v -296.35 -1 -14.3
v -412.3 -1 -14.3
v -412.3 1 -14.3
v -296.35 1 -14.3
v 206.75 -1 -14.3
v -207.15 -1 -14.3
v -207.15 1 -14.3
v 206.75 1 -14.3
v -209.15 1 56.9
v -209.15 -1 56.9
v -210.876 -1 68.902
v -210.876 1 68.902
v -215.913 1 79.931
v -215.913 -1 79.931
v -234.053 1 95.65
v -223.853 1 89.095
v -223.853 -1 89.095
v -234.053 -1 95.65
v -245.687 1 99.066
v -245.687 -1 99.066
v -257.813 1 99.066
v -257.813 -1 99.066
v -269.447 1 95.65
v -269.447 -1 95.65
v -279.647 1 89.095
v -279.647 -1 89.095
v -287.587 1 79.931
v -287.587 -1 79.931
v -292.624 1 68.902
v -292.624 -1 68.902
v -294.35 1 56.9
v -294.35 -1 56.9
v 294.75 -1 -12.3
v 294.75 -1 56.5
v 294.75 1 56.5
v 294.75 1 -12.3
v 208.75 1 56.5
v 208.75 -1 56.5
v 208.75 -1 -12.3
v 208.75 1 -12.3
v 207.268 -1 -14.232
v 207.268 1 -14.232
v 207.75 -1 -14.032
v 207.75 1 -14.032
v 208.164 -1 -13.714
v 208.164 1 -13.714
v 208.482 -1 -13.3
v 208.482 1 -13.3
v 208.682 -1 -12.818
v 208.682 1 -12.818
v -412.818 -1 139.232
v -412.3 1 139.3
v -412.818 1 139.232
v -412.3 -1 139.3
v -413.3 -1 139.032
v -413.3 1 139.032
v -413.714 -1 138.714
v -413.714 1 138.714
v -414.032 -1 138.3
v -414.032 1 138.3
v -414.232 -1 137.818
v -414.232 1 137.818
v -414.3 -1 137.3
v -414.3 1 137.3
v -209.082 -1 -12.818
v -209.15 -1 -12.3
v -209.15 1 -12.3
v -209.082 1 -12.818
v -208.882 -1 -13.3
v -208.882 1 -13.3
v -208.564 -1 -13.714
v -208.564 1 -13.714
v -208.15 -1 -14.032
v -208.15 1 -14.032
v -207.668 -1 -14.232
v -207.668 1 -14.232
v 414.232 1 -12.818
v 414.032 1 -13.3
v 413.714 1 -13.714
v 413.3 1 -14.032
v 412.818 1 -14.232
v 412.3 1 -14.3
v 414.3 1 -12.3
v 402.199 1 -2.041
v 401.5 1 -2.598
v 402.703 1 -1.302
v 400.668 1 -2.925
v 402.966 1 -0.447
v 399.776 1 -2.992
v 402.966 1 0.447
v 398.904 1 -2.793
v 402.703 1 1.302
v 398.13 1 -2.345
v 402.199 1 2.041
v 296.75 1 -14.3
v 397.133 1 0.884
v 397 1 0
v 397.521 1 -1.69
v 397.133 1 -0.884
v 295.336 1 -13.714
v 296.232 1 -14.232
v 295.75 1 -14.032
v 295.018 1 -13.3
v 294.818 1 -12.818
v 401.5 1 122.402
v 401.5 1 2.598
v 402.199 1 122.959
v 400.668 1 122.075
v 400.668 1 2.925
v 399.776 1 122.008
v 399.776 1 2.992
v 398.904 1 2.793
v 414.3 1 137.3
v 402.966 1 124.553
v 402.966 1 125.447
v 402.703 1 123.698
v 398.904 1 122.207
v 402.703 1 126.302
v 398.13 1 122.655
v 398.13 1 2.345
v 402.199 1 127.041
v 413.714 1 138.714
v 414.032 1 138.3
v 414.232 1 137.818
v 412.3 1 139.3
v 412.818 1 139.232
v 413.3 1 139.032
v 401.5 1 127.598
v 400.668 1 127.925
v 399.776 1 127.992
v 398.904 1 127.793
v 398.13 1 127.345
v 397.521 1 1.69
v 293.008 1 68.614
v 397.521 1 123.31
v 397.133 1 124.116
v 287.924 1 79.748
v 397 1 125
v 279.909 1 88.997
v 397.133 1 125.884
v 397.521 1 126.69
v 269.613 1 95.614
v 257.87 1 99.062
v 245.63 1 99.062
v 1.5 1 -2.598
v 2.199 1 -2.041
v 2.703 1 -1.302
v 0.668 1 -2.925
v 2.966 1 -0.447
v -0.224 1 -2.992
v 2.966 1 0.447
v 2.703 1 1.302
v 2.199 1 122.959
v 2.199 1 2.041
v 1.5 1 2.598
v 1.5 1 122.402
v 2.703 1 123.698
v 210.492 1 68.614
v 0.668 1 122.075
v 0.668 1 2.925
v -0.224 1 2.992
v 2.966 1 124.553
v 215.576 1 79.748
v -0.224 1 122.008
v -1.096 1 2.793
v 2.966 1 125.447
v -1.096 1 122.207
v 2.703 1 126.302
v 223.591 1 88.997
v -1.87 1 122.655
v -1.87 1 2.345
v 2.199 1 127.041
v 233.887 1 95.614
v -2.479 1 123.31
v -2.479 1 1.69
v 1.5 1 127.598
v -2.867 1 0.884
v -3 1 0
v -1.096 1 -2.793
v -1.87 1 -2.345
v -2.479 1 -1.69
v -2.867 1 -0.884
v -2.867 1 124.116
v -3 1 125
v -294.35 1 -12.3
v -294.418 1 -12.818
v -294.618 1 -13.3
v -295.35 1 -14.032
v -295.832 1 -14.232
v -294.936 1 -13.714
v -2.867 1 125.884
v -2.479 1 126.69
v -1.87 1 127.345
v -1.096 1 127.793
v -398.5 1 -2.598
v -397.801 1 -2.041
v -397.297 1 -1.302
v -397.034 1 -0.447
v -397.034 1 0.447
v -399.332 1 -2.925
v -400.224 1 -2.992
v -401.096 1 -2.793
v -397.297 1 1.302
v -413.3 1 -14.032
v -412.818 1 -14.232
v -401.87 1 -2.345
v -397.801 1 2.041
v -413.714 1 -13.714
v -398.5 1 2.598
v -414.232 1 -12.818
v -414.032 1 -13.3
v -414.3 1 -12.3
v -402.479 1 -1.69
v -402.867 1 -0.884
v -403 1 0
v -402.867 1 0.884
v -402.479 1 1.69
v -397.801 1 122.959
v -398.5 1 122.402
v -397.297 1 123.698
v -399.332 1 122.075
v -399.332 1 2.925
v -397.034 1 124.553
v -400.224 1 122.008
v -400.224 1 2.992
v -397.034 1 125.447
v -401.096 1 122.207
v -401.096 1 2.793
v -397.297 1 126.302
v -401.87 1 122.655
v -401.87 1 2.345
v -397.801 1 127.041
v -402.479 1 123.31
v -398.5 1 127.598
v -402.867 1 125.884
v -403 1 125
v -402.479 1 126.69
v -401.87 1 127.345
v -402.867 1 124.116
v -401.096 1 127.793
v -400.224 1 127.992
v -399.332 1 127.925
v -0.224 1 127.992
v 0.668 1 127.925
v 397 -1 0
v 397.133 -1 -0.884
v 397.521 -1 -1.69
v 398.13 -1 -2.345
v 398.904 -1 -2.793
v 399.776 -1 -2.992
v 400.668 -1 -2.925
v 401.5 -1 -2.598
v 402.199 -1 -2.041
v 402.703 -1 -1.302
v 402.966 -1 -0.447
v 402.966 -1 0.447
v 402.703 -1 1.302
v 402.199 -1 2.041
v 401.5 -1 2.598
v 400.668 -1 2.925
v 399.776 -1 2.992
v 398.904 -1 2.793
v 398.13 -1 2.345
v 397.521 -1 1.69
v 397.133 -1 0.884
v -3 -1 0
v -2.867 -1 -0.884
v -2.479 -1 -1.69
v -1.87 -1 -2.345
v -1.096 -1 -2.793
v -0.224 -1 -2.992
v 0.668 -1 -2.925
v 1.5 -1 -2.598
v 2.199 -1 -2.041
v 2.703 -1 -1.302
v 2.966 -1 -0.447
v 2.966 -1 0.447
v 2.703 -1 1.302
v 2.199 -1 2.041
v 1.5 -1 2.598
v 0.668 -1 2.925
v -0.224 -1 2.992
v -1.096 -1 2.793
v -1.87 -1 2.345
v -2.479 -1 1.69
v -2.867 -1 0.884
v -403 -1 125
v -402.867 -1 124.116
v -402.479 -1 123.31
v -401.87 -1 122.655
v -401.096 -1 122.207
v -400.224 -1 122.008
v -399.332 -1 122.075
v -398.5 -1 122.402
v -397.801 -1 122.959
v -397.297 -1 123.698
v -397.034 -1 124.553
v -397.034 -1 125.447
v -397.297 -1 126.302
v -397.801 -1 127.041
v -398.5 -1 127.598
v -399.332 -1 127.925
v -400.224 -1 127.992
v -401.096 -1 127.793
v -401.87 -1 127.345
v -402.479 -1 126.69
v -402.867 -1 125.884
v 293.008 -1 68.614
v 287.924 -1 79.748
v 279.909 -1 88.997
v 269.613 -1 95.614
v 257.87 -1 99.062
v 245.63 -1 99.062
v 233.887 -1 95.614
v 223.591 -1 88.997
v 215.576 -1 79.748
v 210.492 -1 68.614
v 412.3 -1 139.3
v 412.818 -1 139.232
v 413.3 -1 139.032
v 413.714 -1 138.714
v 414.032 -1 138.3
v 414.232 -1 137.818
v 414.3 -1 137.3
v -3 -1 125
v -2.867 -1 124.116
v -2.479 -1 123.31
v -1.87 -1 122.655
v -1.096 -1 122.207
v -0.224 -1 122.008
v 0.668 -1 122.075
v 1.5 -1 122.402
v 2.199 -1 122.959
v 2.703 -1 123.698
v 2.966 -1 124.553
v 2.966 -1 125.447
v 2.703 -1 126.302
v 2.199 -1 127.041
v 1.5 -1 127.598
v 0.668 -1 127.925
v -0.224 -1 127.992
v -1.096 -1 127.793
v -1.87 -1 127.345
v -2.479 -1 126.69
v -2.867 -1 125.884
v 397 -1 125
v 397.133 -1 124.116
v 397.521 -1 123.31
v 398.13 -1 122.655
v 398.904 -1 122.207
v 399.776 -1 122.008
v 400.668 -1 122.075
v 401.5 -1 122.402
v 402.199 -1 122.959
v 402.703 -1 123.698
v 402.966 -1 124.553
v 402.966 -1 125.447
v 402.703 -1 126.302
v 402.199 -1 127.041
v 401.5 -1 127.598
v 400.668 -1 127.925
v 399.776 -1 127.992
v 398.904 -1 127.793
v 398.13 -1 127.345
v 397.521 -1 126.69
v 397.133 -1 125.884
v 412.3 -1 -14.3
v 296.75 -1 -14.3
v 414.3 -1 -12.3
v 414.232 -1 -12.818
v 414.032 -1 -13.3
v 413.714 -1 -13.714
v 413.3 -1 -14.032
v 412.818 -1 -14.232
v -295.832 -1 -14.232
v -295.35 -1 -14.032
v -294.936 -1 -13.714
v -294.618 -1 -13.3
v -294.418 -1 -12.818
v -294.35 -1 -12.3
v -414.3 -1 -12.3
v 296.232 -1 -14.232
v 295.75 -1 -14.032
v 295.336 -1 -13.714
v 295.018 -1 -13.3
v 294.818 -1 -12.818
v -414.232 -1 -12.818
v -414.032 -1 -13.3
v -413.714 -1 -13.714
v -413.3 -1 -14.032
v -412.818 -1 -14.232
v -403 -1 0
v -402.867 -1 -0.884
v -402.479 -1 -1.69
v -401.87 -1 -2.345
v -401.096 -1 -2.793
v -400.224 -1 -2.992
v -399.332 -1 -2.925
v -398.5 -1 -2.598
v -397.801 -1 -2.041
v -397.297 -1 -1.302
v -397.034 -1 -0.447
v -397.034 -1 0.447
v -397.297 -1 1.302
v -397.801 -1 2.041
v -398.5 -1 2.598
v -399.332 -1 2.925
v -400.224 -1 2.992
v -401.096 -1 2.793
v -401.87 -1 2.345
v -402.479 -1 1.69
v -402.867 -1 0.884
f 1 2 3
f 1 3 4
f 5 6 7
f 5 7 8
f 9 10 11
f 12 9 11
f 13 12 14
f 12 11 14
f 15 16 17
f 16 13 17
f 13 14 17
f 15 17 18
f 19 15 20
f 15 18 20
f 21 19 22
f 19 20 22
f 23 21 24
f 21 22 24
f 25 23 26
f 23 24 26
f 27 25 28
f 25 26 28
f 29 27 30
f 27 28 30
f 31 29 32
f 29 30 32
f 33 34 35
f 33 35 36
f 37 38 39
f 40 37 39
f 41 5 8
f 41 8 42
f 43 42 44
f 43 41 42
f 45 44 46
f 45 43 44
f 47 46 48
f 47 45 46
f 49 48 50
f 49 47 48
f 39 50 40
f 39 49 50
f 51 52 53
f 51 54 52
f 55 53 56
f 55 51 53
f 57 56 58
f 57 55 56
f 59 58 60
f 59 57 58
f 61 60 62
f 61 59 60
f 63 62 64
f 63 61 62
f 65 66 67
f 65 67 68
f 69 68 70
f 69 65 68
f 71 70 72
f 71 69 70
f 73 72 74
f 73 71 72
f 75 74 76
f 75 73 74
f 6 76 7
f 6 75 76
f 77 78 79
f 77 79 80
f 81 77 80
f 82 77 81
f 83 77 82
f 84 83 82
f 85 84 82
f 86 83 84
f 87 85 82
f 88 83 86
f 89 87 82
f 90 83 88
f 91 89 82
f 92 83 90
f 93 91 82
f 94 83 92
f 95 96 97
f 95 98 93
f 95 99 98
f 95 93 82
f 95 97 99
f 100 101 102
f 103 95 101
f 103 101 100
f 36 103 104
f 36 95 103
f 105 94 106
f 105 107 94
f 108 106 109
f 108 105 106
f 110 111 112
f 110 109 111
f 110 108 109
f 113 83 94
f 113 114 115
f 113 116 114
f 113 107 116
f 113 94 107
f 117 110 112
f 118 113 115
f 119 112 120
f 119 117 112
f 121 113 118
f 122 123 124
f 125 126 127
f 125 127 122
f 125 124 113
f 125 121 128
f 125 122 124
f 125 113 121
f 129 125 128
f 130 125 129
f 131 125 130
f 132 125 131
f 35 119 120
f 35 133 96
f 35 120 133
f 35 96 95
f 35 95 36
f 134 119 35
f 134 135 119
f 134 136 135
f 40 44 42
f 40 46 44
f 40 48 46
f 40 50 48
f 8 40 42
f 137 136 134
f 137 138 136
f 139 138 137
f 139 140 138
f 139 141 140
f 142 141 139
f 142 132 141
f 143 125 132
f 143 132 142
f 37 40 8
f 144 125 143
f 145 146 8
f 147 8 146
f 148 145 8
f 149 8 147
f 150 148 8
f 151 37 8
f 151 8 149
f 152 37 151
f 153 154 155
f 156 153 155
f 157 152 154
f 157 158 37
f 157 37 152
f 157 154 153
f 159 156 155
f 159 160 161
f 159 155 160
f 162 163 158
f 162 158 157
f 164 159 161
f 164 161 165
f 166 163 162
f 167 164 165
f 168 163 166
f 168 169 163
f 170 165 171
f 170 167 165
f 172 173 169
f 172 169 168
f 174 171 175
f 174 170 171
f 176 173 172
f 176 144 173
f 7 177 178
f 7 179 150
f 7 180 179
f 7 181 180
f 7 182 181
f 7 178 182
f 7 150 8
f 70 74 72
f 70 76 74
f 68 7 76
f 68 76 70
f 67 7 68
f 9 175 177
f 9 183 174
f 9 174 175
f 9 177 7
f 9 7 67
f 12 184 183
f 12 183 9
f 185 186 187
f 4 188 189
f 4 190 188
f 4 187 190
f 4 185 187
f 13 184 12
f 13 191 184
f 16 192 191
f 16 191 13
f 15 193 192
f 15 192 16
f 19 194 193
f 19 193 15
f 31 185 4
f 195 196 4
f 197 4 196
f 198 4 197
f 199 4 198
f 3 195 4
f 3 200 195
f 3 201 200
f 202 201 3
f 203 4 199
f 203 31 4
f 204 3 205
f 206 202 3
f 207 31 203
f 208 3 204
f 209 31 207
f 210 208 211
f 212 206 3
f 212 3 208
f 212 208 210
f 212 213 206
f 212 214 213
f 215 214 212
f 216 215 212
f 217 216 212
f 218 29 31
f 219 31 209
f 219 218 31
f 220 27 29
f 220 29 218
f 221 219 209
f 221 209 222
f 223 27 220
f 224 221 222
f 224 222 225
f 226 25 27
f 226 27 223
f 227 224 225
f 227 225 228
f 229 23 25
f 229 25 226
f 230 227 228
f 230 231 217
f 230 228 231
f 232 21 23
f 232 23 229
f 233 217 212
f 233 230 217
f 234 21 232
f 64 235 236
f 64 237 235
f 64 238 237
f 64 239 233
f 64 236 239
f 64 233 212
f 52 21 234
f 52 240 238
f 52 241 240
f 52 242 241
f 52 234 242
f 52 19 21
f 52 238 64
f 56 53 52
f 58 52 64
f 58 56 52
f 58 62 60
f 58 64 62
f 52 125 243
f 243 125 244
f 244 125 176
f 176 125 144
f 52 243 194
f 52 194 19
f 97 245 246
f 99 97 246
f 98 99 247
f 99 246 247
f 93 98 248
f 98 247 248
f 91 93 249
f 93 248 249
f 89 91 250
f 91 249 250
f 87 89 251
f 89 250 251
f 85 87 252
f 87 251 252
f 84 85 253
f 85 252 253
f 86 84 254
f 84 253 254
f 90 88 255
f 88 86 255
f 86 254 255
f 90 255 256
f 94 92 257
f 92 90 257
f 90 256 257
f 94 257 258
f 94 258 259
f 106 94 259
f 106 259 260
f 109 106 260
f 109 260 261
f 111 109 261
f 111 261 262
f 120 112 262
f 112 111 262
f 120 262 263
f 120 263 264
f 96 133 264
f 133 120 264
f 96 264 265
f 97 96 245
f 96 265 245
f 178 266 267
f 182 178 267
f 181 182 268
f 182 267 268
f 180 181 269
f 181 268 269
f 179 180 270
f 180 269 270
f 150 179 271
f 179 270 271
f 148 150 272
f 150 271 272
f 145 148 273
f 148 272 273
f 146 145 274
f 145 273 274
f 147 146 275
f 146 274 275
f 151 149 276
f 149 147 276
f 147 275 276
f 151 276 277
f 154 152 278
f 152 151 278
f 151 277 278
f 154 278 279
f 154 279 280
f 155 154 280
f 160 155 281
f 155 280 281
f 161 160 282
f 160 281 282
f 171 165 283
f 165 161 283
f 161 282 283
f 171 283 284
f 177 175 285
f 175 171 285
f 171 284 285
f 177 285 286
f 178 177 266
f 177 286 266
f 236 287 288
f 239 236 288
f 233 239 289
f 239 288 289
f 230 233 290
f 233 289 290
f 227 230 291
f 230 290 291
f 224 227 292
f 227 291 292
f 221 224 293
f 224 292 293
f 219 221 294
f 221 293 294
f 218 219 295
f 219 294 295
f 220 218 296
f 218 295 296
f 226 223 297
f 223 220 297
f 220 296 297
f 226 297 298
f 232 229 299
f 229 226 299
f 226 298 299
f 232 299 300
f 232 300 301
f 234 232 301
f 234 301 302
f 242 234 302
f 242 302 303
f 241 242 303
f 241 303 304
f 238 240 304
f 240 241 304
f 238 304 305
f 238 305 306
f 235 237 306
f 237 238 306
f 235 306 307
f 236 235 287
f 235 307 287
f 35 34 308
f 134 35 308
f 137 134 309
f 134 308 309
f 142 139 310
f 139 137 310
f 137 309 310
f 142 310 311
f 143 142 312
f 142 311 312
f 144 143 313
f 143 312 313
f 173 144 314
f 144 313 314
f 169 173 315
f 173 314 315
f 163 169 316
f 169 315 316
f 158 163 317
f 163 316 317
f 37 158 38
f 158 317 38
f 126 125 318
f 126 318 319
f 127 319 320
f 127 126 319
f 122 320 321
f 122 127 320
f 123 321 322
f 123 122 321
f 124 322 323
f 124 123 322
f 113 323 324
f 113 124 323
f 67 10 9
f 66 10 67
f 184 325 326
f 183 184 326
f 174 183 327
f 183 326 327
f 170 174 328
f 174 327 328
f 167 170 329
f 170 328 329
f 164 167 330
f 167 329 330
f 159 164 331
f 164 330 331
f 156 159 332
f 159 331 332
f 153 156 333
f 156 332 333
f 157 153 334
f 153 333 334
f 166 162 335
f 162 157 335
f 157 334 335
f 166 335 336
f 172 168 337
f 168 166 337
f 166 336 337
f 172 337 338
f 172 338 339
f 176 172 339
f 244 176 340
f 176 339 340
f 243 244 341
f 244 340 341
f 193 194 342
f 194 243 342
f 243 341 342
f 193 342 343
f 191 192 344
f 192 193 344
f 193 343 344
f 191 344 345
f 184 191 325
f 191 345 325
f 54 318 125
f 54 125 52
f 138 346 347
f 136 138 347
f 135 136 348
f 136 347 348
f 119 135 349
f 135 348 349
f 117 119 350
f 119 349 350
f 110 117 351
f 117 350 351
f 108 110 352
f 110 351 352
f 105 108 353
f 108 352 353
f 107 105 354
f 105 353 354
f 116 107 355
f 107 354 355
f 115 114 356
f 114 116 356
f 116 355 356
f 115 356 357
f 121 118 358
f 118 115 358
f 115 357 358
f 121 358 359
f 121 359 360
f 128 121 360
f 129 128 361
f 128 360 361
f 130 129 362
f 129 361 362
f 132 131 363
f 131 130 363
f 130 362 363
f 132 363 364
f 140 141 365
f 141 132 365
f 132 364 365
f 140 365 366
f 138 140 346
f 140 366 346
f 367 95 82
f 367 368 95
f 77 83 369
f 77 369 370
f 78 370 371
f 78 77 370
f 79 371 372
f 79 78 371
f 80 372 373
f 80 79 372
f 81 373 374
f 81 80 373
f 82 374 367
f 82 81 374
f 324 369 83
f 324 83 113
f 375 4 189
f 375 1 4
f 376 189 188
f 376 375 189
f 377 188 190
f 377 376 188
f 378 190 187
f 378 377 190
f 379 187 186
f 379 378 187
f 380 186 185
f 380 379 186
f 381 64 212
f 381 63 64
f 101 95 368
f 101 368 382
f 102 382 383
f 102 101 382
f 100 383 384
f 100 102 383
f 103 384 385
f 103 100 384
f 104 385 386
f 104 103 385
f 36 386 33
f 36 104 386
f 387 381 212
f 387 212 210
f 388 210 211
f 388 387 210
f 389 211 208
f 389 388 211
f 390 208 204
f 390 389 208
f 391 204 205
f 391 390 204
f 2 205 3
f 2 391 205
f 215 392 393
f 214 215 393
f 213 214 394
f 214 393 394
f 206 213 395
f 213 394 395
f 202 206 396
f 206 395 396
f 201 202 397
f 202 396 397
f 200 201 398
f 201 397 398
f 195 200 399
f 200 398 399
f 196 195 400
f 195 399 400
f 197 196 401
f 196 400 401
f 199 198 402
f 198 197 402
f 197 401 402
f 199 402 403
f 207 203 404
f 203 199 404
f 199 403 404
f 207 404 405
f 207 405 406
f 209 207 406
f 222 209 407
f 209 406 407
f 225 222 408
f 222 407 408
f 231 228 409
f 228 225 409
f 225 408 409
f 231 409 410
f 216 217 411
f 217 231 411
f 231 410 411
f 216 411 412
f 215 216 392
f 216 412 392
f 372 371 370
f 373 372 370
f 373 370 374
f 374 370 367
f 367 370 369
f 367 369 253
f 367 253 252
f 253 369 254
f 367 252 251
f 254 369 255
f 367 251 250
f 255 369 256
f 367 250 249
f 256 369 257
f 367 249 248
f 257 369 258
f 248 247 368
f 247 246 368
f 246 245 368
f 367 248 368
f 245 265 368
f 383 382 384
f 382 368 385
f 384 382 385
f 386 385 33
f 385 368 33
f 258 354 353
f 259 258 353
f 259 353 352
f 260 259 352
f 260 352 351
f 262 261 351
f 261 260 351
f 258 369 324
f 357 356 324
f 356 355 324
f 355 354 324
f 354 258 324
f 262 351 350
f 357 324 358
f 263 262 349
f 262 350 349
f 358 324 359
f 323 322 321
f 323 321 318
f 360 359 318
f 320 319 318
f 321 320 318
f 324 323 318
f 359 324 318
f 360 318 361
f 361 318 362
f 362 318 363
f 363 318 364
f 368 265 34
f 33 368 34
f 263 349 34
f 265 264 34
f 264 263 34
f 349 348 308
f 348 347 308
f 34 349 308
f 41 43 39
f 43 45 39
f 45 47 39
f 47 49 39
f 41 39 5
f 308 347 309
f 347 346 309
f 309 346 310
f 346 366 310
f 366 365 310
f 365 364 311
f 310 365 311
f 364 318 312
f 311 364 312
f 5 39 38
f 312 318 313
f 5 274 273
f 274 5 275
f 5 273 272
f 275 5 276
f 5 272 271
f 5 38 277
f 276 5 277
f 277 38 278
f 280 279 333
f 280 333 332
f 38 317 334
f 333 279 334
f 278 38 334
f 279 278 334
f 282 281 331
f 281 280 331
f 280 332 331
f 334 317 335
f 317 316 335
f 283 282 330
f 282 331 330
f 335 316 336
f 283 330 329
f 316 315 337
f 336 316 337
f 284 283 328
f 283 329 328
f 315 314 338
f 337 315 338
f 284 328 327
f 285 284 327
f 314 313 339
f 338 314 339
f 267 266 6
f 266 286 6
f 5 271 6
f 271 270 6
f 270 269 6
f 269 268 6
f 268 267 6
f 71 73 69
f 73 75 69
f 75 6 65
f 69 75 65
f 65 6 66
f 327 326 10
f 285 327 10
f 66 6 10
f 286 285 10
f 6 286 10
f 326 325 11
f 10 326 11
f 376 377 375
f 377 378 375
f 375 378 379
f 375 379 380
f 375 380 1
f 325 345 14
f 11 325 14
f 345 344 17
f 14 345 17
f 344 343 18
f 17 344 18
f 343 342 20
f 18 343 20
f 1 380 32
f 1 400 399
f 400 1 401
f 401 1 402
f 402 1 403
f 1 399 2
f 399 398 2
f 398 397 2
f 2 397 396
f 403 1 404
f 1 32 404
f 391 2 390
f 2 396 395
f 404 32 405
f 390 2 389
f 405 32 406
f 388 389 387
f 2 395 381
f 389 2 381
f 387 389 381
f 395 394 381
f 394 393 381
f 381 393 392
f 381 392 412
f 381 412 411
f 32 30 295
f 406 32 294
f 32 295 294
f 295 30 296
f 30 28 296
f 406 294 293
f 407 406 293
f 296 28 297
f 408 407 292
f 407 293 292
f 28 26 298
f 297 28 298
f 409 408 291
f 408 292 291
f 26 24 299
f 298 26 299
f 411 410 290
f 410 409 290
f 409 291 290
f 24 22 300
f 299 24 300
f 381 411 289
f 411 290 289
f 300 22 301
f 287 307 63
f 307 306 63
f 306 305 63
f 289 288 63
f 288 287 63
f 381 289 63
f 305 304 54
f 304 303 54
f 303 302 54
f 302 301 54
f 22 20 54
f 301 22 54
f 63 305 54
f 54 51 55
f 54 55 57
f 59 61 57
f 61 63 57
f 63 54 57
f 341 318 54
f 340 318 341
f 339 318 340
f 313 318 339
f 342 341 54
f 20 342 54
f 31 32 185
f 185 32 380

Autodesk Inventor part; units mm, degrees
ref_plane "YZ Plane" through (0, 0, 0) normal (1, 0, 0) x (0, 1, 0)
ref_plane "XZ Plane" through (0, 0, 0) normal (0, 1, 0) x (-1, 0, 0)
ref_plane "XY Plane" through (0, 0, 0) normal (0, 0, 1) x (1, 0, 0)
sketch "Sketch1" plane through (0, 0, 0) normal (0, 1, 0) x (-1, 0, 0)
  line L0 (-414.3, 17.5) -> (-414.3, 107.5) construction
  line L1 (-417.5, -14.3) -> (417.5, -14.3) construction
  line L2 (417.5, 139.3) -> (-417.5, 139.3) construction
  line L3 (414.3, 107.5) -> (414.3, 17.5) construction
  line L4 (417.5, 110.7) -> (-417.5, 110.7) construction
  circle A0 centre (-400, 0) radius 2 construction
  circle A1 centre (-400, 125) radius 2 construction
  circle A2 centre (400, 0) radius 2 construction
  circle A3 centre (400, 125) radius 2 construction
  circle A4 centre (0, 125) radius 2 construction
  circle A5 centre (0, 0) radius 2 construction
  arc A6 (-255.8176, 91.7662) -> (-287.0162, 60.5676) centre (-251.75, 56.5) ccw construction
  arc A7 (-247.75, 95.5) -> (-255.75, 95.5) centre (-251.75, 95.5) ccw construction
  arc A8 (255.75, 95.5) -> (247.75, 95.5) centre (251.75, 95.5) ccw construction
  line L5 (417.5, 14.3) -> (-417.5, 14.3) construction
  line L6 (0, -14.3) -> (0, 139.3) construction
  line L7 (-414.3, 139.3) -> (414.3, 139.3)
  line L8 (414.3, 139.3) -> (414.3, -14.3)
  line L9 (-414.3, -14.3) -> (-414.3, 139.3)
  line L10 (-414.3, 139.3) -> (414.3, -14.3) construction
  line L11 (414.3, 139.3) -> (-414.3, -14.3) construction
  line L12 (-251.75, 99.5) -> (-251.75, 14.3) construction
  line L13 (251.75, 99.5) -> (251.75, 14.3) construction
  line L14 (-294.75, 56.5) -> (-294.75, -14.3)
  line L15 (-208.75, 56.5) -> (-208.75, -14.3)
  line L16 (209.15, 56.9) -> (209.15, -14.3)
  line L17 (294.35, 56.9) -> (294.35, -14.3)
  arc A9 (-260.011, 14.301) -> (-260.0059, 14.3) centre (-251.75, 56.5) ccw
  arc A10 (-208.75, 56.5) -> (-294.75, 56.5) centre (-251.75, 56.5) ccw
  arc A11 (294.35, 56.9) -> (209.15, 56.9) centre (251.75, 56.9) ccw
  line L18 (-294.75, -14.3) -> (-414.3, -14.3)
  line L19 (414.3, -14.3) -> (294.35, -14.3)
  line L20 (209.15, -14.3) -> (-208.75, -14.3)
  circle A12 centre (-400, 0) radius 3
  circle A13 centre (-400, 125) radius 3
  circle A14 centre (0, 0) radius 3
  circle A15 centre (0, 125) radius 3
  circle A16 centre (400, 125) radius 3
  circle A17 centre (400, 0) radius 3
  point P0 (0, 0)
  point P1 (0, 62.5)
  dimension "d0" = 828.6
  dimension "d1" = 43
  dimension "d2" = 125
  dimension "d3" = 1
  dimension "d4" = 1
  dimension "d5" = 1
  dimension "d6" = 1
  dimension "d7" = 1
  dimension "d8" = 1
extrude "Extrusion1" add sketch "Sketch1" along normal mid plane 2
fillet "Fillet1" radius 2 8 edges at (414.3, 0, -14.3) (208.75, 0, -14.3) (294.75, 0, -14.3) (-209.15, 0, -14.3) (-294.35, 0, -14.3) (-414.3, 0, -14.3) (414.3, 0, 139.3) (-414.3, 0, 139.3)
properties part number "Cover_LeftRight" material "Steel, Galvanized"
